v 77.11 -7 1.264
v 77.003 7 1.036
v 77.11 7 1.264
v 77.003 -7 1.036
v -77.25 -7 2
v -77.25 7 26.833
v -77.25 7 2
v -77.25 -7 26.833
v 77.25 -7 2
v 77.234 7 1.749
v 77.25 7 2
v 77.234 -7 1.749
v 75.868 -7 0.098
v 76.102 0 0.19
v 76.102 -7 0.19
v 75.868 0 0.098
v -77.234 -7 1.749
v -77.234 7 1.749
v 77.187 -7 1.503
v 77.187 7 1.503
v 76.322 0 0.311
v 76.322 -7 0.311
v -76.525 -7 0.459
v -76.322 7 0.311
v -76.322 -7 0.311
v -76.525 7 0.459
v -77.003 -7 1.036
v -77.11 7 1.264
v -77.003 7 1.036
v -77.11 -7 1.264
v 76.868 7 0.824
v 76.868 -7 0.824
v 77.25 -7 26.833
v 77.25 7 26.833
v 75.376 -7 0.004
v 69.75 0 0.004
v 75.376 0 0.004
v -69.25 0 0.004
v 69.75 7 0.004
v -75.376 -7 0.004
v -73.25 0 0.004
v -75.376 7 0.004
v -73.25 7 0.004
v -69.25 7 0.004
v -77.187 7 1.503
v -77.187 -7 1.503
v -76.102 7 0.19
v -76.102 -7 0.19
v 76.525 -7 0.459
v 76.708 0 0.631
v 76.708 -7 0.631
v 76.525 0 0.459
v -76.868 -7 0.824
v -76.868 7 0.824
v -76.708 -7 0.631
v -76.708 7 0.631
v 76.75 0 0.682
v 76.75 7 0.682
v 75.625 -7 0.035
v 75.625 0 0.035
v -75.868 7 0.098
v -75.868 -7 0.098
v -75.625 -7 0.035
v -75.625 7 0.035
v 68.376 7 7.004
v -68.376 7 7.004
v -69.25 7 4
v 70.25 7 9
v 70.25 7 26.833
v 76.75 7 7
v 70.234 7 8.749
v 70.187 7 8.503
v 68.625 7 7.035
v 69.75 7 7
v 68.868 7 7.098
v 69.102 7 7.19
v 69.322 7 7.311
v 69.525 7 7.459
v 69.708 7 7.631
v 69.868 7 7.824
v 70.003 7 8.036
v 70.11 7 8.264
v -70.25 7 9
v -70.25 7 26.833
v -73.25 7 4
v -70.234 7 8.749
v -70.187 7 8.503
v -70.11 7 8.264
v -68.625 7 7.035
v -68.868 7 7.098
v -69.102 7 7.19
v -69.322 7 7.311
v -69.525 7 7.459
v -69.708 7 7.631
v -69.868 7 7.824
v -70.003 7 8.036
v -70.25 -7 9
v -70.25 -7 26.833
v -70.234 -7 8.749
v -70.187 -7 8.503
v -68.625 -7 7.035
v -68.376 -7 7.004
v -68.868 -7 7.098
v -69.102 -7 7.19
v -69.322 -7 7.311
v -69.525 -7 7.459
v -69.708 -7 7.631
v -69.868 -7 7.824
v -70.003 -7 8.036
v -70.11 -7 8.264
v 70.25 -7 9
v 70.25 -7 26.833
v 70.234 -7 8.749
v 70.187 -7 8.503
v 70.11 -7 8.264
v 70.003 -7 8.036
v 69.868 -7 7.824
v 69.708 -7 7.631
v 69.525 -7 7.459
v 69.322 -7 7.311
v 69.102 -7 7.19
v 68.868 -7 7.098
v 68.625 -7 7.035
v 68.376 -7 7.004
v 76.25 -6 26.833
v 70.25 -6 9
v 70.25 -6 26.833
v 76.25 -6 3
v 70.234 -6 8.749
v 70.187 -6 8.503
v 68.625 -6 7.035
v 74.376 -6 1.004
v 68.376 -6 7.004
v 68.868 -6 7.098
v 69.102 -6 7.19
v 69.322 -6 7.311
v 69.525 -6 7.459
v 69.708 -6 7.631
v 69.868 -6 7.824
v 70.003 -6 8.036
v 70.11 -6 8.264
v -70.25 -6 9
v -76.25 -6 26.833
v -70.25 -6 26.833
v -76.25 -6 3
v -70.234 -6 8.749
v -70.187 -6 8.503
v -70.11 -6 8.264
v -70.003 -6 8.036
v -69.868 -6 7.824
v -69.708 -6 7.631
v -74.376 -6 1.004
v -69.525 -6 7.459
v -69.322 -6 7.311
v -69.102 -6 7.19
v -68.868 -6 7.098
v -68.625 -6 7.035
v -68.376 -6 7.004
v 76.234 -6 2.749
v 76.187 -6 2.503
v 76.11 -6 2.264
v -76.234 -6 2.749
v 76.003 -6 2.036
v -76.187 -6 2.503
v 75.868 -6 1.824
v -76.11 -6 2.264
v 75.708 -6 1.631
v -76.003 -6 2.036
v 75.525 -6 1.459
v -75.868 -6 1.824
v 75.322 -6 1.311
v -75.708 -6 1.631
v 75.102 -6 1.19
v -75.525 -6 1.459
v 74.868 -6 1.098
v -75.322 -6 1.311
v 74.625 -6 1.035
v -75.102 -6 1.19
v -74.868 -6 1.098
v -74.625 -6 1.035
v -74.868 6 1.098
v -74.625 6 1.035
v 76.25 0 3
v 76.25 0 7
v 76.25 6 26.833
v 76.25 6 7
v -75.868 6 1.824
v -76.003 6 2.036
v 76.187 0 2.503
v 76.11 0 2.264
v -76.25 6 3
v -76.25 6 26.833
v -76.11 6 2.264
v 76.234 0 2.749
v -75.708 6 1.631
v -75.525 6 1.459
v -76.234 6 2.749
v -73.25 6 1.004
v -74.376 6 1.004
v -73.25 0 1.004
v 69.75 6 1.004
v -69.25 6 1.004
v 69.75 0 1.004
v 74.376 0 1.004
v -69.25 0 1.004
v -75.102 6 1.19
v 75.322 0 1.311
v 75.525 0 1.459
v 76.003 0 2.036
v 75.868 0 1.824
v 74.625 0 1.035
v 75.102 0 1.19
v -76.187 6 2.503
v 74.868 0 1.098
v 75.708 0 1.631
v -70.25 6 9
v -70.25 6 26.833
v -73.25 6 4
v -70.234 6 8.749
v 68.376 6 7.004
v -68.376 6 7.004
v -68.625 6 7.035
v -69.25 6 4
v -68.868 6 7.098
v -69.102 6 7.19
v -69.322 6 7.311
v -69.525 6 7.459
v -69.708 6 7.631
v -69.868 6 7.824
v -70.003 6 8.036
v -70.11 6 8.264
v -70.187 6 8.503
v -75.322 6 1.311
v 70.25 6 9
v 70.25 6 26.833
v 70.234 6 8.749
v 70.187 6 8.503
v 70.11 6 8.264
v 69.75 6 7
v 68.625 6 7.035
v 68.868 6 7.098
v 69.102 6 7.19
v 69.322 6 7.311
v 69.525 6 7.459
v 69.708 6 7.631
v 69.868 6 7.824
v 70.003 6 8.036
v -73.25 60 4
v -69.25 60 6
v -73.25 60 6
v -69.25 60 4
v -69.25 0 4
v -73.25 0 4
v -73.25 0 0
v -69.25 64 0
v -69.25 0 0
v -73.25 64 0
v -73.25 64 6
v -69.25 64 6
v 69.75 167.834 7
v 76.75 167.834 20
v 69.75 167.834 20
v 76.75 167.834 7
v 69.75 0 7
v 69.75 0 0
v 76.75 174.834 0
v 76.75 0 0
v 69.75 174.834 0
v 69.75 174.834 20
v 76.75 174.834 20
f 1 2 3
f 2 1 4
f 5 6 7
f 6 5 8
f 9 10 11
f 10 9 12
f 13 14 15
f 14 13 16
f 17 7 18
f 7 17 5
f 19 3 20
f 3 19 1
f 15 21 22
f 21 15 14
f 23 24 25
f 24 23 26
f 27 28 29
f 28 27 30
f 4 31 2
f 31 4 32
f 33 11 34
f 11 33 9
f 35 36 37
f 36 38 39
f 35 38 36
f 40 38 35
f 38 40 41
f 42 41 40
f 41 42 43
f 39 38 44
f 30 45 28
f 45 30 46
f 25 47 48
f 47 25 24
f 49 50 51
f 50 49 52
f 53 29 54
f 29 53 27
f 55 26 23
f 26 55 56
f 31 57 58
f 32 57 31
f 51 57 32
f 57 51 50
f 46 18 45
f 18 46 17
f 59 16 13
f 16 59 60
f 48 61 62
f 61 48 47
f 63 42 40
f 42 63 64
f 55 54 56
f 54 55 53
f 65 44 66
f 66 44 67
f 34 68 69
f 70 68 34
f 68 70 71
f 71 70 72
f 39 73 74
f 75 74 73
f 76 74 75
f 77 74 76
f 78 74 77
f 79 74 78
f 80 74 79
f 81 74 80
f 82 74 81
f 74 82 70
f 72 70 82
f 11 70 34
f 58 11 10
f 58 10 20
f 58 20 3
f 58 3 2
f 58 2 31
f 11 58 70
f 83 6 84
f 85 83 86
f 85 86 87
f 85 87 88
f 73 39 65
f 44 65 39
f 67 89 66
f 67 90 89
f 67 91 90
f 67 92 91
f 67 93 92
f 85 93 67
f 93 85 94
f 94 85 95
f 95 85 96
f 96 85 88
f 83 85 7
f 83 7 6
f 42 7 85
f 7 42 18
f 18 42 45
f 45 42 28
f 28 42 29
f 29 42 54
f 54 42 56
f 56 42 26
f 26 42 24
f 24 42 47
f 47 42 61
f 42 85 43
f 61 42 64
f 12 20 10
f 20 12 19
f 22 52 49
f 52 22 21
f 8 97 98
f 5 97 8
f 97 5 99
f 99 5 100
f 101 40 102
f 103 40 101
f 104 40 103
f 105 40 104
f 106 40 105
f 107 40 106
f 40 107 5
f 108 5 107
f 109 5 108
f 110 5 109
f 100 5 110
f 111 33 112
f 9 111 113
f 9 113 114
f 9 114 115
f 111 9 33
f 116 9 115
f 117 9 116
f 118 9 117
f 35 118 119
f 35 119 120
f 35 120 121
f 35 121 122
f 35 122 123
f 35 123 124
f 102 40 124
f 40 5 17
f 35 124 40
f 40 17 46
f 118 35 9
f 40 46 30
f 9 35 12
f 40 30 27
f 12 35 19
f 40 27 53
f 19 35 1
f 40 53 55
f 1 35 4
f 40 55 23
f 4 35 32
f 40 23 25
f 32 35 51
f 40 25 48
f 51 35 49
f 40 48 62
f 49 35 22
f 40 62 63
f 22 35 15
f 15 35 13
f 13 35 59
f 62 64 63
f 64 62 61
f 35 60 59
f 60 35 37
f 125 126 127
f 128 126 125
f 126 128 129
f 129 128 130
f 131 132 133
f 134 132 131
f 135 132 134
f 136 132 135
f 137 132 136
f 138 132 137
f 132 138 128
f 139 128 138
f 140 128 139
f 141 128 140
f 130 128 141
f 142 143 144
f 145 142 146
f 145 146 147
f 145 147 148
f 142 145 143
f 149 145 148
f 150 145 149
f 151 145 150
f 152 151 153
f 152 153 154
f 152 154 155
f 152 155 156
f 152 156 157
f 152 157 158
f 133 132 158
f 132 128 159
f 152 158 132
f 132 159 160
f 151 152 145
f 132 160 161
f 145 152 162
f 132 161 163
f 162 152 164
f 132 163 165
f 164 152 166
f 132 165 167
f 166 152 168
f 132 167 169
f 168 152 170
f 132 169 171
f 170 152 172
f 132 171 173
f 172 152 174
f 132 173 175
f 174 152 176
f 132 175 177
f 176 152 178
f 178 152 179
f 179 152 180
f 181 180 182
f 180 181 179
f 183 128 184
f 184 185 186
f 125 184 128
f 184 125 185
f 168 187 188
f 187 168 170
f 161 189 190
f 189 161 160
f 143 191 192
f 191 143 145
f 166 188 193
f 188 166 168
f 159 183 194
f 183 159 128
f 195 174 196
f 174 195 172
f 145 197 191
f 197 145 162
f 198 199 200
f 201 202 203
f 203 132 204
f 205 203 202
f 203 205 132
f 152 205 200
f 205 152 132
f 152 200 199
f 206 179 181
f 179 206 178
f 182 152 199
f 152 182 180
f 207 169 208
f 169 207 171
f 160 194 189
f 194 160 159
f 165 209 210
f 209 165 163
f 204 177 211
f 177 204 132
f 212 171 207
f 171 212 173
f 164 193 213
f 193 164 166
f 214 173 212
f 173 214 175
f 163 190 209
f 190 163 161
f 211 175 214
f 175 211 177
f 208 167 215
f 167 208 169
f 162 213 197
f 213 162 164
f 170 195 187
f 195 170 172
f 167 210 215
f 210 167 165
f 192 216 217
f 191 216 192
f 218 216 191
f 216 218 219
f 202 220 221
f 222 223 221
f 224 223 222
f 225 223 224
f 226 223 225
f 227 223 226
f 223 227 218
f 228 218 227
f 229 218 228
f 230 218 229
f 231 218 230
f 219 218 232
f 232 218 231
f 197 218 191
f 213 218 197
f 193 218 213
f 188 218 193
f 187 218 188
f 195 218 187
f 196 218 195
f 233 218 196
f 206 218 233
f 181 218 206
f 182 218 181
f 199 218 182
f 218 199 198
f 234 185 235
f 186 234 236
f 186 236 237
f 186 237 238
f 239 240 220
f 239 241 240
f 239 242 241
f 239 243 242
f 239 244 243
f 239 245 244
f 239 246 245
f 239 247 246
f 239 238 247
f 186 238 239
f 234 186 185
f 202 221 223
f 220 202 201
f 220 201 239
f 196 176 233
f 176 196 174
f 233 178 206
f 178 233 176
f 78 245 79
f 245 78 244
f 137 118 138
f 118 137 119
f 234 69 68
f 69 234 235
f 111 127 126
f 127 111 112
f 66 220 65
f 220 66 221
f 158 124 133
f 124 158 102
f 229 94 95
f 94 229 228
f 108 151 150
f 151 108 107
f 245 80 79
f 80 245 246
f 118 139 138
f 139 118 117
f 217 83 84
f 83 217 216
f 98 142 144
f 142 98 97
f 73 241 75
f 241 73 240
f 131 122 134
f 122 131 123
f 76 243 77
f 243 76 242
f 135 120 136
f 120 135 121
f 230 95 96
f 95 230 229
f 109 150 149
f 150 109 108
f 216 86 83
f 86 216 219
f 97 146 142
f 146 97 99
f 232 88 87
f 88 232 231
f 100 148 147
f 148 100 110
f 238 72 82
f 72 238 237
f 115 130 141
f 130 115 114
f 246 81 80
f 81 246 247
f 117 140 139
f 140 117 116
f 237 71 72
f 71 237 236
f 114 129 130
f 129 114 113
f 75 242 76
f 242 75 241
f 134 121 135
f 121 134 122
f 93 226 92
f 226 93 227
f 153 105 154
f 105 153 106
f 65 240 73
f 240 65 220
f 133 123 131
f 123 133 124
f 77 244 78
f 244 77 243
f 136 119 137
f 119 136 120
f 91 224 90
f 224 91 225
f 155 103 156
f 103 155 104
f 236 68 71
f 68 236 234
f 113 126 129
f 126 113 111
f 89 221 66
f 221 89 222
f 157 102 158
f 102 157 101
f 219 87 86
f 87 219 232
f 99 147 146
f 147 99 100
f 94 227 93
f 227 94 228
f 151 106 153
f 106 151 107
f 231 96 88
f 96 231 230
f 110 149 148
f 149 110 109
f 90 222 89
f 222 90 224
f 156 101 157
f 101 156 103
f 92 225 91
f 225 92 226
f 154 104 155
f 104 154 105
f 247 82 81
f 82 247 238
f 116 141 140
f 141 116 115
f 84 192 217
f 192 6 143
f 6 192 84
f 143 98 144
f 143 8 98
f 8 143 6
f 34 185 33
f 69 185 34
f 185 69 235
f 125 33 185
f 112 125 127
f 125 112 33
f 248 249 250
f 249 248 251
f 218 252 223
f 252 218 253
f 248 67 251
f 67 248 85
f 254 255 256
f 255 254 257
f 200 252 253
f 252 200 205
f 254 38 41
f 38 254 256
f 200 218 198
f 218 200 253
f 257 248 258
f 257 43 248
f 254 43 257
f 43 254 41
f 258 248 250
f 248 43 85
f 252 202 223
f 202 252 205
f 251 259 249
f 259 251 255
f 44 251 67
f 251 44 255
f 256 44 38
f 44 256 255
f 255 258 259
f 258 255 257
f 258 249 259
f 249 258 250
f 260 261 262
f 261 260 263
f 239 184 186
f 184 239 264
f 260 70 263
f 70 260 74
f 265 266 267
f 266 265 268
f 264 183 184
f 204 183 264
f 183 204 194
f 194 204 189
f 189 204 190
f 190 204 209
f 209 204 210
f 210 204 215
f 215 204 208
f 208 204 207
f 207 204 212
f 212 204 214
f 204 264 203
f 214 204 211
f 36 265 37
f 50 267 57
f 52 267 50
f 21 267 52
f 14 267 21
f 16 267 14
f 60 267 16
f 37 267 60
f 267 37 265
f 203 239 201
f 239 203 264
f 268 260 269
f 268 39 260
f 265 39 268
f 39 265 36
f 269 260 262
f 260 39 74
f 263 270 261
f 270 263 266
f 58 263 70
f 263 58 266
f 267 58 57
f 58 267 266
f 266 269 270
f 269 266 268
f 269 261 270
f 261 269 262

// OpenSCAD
// file: ../../lib/utils.scad
// Cube with rounded corners
// roundedCornerCube (50,50,4);
module roundedCornerCube(length, width, thickness){

        hull()
        {
            translate([length/2 - 2, width/2 - 2, 0]) cylinder(r=2, h=thickness, $fn=50, center=true);
            translate([length/2 - 2, -width/2 + 2, 0]) cylinder(r=2, h=thickness, $fn=50, center=true);
            translate([-length/2 + 2, width/2 - 2, 0]) cylinder(r=2, h=thickness, $fn=50, center=true);
            translate([-length/2 + 2, -width/2 + 2, 0]) cylinder(r=2, h=thickness, $fn=50, center=true);
        }

}

// Hollow cube with rounded corners. Will look like a frame with rounded con
// hollowRoundedCornerCube(50,70,4,2);
module hollowRoundedCornerCube(length, width, thickness, wallthickness)
{
    difference()
    {
        roundedCornerCube(length,width,thickness);
        roundedCornerCube(length-(wallthickness*2),width-(wallthickness*2),thickness);
    }
}

/*
module cylinderWithHandle(radius, thickness)
{
    rotate_extrude($fn=100)
        polygon( points = [[0,0], [radius,0], [radius,thickness] , [1,thickness], [2,thickness + 2] , [2,thickness + 6],[0,thickness + 6]] );
}
*/


// hollow cylinder
// hollowCylinder(radius, height, wallThickness)
// radius : radius to outter wall
// wallThickness : Thickness of wall
module hollowCylinder(radius, height, wallThickness)
{

    difference()
    {
        cylinder(h=height, r1=radius, r2=radius);
        translate([0,0,-.02]) cylinder(h=height + .04, r1=radius - wallThickness, r2=radius - wallThickness);
    }
}


// hollow cylinders
// hollowCylinders(20, 10, 2, 2, 2)
// radius : radius to outer wall
// gapsSize : size of gap between each rings
// minradius : radius of the smallest ring
module hollowCylinders(radius, height, wallThickness, gapSize, minRadius)
{
    for (i = [radius : -(gapSize + wallThickness) : minRadius])
    {
       //echo (i);
       hollowCylinder(i,height,wallThickness);
    }
}

//
// b = bottom diameter
// t = top diameter
// h = height
module cone(b, t, h)
{
    cylinder(h=h, r1=b/2, r2=t/2, $fn=100);
}

// hollowCone(10,4,20, 2)
module hollowCone(bottomRadius, topRadius, height, wallThickness)
{
    difference()
    {
        cylinder(h=height, r1=bottomRadius, r2=topRadius, $fn=100);
        translate([0,0,-.02]) cylinder(h=height, r1=bottomRadius - wallThickness, r2=topRadius - wallThickness, $fn=100);
    }
}


// w = width between flat surface
// h = height
module hex (w=10, h=2){
  cylinder (r=w/2, h=h, center=true, $fn=6);
}

// hollowCone(10,4,20, 2)
module hollowHex(w=10, h=2, th=2)
{
    difference()
    {
        cylinder (r=w/2, h=h, center=true, $fn=6);
        cylinder (r=w/2 - th, h=h, center=true, $fn=6);
    }
}

// h : height
// ns : number of sides for base
// br : bottom radius
// tr : top radius
// ro : rotation in degree between bottom and top
// sl : slice layer. high value give smooth appearence
module twistExtrude(h=50,ns=6,br=20,tr=20,ro=100,sl=5)
{

	linear_extrude(height = h, twist  = ro,	slices = sl, scale  = tr/br)
		circle(r=br, $fn=ns);
}


// h : height
// ns : number of sides for base
// br : bottom radius
// tr : top radius
// ro : rotation in degree between bottom and top
// sl : slice layer. high value give smooth appearence
// wt : wall thickness
module hollowTwistExtrude(h=50,ns=6,br=20,tr=20,ro=100,sl=5,wt=1)
{
	difference()
	{
		linear_extrude(height = h, twist  = ro,	slices = sl, scale  = tr/br)
			circle(r=br, $fn=ns);

    translate([0,0,-.01])
		linear_extrude(height = h + .1, twist  = ro,	slices = sl, scale  = tr/br)
			circle(r=br - wt, $fn=ns);
	}
}


///////////////////////////////////////////////////////////////////////////////////////////////////////////////////

// honeycomb tiles
// honeycombSquare(100,100,4,10,2);
module honeycombTiles(length, width,thickness,rad,wallThickness)
{
    //thickness = 4;
    //rad = 10;
    //wallThickness = 2;
    //length = 100;
    //width = 100;

    for (w=[0: width/rad])
    {

        if (w % 2 == 0)
        {
            //cylinder($fn=6, r=rad, h=2);
            for (i = [0 : length/((rad*2) + (wallThickness*2))])
            {
              translate([rad*(3*i) + (wallThickness*2)*i,w*rad,0]) cylinder($fn=6, r=rad, h=thickness);

              //translate([rad*6 + (wallThickness*2)*2,0,0]) cylinder($fn=6, r=10, h=2);
              //translate([rad*9 + (wallThickness*2)*3,0,0]) cylinder($fn=6, r=10, h=2);
            }
        }

        if (w % 2 == 1)
        {
            for (j = [1 : 2 : (length/(rad + wallThickness))])
            {
              translate([(rad*1.5) *j + wallThickness *j , (w*rad) + wallThickness/2 ,0])  cylinder($fn=6, r=rad, h=thickness);
                //translate([(rad*1.5) *3 + wallThickness *3 ,10,0]) circle($fn=6, r=10);
                //translate([(rad*1.5) *5 + wallThickness *5 ,10,0]) circle($fn=6, r=10);
            }
        }
    }
}

// honeycomb square
// A square area with hollow honeycomb design
// honeycombSquare(100,100,4,10,2);
module honeycombSquare(length, width, thickness, cellRad,wallThickness)
{
    difference()
    {
        cube([length,width,thickness], center=true);
        translate([-length/2,-width/2, -thickness/2]) honeycombTiles(length,width,thickness,cellRad,wallThickness);
    }
}

//honeycomb(length, width, height, cell_size, wall_thickness);
//honeycomb(50, 50, 4, 10, 1);
//hollowRoundedCornerCube(50,70,4,2);

//hollowCylinder(10,20,2);

//hollowCylinders(20, 10, 2, 2, 2);
//cone(10,2,20);

// hollowCone(10,4,20, 2);

// honeycombSquare(40,40,2,5,2);


module edgeClamp(l=10)
{
   difference()
   {
    translate([0,.6,0]) rotate([45,0,0]) cube([l,2,2], center=true);
    translate([0,.6,1.5]) cube([l + .1,1,1], center=true);
    translate([0,.6,-1.5]) cube([l + .1,1,1], center=true);
   }
   cube([l,2,2], center=true);
}

cube([10,2,2], center=true);
translate([0,0,2]) edgeClamp();
// main file
use <../../lib/utils.scad>



l = 152.5; // length
w = 77.5; // width
h = 12; // height/thickness of phone
t = 2; // thickness of the sleve


module phone()
{
    roundedCornerCube(l, w, t);
}

// phone();

/*
translate([0,0,15])
union()
{
    difference()
    {
        cube([14 + 2,10,30] , center=true);
        translate([0,0,1]) cube([14 ,10 + 1,30] , center=true);
    }

    translate([-(14/2) - 2,0,-(15/2)])
    rotate([180,0,0])
    difference()
    {
        cube([2 + 2,10,15] , center=true);
        translate([0,0,1]) cube([2 ,10 + 1,15] , center=true);
    }
}
*/

/*
//top
translate([0,w/2 - 4,h/2 - 4])
 rotate([0,90,0])
 difference()
 {
    cube([8,8,l], center=true);
    translate([0,0,-l/2]) cylinder(r1=4,r2=4,h=l,$fn=50);
    translate([4,0,0]) cube([8.02,8.02,l + 1], center=true);
    translate([0,-4,0]) cube([8.02,8.02,l + 1], center=true);
 }

 //bottom
 translate([0,-w/2 + 4,h/2 - 4])
 rotate([0,90,180])
 difference()
 {
    cube([8,8,l], center=true);
    translate([0,0,-l/2]) cylinder(r1=4,r2=4,h=l,$fn=50);
    translate([4,0,0]) cube([8.02,8.02,l + 1], center=true);
    translate([0,-4,0]) cube([8.02,8.02,l + 1], center=true);
 }

 // left
 translate([-l/2 + 4,0,h/2 - 4])
 rotate([90,0,0])
 difference()
 {
    cube([8,8,w], center=true);
    translate([0,0,-w/2]) cylinder(r1=4,r2=4,h=w,$fn=50);
    translate([4,0,0]) cube([8.02,8.02,w + 1], center=true);
    translate([0,-4,0]) cube([8.02,8.02,w + 1], center=true);
 }

 // right
translate([l/2 - 4,0,h/2 - 4])
rotate([90,0,180])
 difference()
 {
    cube([8,8,w], center=true);
    translate([0,0,-w/2]) cylinder(r1=4,r2=4,h=w,$fn=50);
    translate([4,0,0]) cube([8.02,8.02,w + 1], center=true);
    translate([0,-4,0]) cube([8.02,8.02,w + 1], center=true);
 }
 */

translate([0,0,w/2 + t/2])
rotate([90,0,0])
union()
 {

   difference()
    {
     union()
     {
        difference()
        {
            roundedCornerCube(l + t, w + t, h + t);
            roundedCornerCube(l, w, h);
        }
      }

        // big hole
        roundedCornerCube(l-12,w-12,h + 3);
        // through sides
        translate([0,w/3,0]) cube([l+10, w ,h +10], center=true);

    }

    //translate([0,w/2+ 20/2, - h/2 + 10/2 - t/2]) roundedCornerCube(10,20,10);
    //translate([0,w/2 + 20 - 3.7,0]) rotate([0,-45,0]) cylinder(r1=3.7,r2=3.7,h=30,$fn=50);
 }


module leg1()
{
  cube([60,4,4]);
  translate([60,0,0]) cube([4,4,6]);
}

module leg2()
{
  cube([60 + (sin(45) * l),7,7]);
  translate([60 + (sin(45) * l),0,0]) cube([7,7,20]);
}

al = sin(45) * l;

echo (al);

translate([-l/2 + 7,0,0]) rotate([0,0,90]) leg1();
translate([l/2 + .5,0,0]) rotate([0,0,90]) leg2();
